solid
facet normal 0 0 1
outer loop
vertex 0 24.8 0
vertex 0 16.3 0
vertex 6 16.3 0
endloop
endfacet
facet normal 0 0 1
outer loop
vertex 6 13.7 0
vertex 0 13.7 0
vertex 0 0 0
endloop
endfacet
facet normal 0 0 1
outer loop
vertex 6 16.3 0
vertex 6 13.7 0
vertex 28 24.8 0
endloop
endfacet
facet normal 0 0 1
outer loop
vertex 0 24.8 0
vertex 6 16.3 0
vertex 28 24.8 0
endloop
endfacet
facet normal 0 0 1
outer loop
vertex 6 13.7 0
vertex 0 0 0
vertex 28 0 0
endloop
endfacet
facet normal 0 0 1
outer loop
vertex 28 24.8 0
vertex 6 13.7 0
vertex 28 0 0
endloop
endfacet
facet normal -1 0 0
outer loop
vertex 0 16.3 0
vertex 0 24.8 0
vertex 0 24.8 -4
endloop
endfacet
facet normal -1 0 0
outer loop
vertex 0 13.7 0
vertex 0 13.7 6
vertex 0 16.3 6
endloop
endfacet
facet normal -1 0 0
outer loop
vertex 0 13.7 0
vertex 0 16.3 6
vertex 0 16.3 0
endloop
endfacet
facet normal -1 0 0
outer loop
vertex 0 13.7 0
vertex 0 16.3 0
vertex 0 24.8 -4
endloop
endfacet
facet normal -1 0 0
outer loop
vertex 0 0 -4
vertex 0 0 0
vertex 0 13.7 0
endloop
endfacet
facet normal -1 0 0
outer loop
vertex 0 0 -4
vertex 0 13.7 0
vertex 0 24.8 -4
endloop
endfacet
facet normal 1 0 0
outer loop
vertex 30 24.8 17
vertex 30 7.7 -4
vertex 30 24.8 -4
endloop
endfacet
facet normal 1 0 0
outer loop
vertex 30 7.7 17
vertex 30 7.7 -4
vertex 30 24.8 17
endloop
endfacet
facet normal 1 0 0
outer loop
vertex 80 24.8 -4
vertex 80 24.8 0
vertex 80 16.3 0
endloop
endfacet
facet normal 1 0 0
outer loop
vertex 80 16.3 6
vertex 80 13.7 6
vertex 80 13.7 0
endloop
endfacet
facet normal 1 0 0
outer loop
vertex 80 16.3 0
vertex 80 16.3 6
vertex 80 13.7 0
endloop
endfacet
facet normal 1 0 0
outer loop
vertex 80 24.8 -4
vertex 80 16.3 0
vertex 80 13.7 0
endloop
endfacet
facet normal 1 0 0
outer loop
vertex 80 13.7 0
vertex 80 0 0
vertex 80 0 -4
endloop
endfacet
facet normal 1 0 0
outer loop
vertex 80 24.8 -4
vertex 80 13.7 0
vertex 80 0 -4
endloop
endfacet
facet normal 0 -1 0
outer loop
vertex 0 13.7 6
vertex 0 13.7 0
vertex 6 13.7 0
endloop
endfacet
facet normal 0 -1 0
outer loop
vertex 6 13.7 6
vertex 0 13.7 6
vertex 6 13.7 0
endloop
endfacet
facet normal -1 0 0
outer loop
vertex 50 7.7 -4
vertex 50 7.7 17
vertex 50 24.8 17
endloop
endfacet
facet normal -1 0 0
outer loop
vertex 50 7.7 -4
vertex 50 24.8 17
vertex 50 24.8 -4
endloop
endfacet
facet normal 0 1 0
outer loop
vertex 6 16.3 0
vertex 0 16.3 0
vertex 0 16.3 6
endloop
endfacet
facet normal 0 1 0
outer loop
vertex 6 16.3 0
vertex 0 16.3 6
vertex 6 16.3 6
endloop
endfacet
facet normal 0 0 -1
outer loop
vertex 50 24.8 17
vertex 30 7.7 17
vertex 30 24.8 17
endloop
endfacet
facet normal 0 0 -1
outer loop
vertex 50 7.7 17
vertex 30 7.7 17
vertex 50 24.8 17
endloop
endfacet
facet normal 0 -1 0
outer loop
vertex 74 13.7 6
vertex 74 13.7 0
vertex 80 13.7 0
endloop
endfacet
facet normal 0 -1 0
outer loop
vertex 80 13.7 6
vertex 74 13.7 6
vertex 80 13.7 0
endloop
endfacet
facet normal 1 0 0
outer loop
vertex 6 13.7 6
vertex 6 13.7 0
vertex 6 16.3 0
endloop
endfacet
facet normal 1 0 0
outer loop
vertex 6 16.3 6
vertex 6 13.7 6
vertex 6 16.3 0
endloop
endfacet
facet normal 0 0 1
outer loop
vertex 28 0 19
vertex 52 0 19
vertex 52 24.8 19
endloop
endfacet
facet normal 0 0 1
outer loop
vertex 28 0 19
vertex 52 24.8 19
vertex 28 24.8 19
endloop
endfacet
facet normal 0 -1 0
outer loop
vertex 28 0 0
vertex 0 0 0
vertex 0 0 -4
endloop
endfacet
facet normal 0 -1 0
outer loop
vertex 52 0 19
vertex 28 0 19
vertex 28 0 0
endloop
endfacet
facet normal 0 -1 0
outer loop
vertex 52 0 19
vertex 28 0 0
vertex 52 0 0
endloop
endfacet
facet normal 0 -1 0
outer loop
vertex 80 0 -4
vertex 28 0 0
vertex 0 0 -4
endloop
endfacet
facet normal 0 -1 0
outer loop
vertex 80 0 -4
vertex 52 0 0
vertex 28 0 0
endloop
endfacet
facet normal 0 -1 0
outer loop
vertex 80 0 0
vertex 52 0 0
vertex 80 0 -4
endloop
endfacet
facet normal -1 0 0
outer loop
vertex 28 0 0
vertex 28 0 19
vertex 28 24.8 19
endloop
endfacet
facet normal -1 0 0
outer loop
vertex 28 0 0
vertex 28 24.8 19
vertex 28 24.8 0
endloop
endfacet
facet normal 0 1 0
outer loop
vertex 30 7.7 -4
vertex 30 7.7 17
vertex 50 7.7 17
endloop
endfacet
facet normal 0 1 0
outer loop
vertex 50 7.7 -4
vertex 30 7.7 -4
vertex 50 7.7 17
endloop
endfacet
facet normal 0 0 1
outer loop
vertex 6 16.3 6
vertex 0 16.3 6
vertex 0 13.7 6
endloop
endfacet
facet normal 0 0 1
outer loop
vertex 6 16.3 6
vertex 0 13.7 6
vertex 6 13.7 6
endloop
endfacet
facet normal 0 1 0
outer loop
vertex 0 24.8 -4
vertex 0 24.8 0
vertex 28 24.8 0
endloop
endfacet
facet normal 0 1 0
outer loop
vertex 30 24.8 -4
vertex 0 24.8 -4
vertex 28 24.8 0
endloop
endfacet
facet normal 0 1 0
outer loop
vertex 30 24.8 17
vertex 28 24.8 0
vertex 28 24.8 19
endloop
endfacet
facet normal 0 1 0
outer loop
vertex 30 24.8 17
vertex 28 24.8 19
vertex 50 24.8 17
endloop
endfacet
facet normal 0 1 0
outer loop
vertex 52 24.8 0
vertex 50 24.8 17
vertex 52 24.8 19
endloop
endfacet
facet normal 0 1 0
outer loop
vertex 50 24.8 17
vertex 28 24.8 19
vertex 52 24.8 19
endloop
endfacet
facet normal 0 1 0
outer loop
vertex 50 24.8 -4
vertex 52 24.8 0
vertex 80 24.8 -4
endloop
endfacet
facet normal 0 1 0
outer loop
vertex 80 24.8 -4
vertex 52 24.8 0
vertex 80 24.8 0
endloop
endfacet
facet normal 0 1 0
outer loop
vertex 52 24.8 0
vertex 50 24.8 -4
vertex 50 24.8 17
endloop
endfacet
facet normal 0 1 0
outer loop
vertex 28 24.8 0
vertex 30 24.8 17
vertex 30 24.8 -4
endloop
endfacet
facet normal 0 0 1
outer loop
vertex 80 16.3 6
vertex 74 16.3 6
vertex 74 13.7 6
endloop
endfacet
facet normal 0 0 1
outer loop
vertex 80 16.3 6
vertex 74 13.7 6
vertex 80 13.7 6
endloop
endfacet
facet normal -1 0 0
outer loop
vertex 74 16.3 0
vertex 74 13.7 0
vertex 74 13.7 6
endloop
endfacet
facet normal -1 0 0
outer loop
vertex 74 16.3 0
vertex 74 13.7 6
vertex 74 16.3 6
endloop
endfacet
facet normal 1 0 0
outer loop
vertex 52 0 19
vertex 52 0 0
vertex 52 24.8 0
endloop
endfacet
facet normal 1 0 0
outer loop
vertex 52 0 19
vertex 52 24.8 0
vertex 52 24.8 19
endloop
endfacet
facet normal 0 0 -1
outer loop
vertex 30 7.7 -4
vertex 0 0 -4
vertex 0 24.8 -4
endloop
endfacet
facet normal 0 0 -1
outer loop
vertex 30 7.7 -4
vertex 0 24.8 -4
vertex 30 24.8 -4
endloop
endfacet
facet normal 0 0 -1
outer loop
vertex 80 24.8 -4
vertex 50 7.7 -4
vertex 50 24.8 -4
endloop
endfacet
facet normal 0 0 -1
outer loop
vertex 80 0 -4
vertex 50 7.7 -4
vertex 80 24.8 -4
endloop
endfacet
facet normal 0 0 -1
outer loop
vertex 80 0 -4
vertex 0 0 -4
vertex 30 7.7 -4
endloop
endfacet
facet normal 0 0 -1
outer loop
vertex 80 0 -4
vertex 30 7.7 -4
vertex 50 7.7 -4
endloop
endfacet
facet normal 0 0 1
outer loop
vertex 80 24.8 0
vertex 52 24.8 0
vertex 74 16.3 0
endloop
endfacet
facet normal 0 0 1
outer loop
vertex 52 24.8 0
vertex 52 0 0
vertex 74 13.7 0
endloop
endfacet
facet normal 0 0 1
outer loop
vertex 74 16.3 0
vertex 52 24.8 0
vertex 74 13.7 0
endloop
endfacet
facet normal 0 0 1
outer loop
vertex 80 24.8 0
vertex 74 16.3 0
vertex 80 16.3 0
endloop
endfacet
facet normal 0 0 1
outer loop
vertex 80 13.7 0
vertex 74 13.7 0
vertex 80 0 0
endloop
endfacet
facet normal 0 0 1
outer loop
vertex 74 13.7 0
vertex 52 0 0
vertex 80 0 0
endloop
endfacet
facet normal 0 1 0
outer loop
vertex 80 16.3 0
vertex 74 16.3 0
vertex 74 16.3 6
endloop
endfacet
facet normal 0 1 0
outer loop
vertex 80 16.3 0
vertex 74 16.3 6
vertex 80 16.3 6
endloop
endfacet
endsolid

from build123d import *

# Parameters (mm, degrees)
SKETCH1_W           = 80
SKETCH1_H           = 4
BOSS_EXTRUDE1_DEPTH = 24.8
SKETCH2_W           = 6
SKETCH2_H           = 2.6
BOSS_EXTRUDE2_DEPTH = 6
SKETCH3_W           = 20
SKETCH3_H           = 24.8
CUT_EXTRUDE1_DEPTH  = 10
EXTRUDE_THIN1_DEPTH = 24.8
SKETCH5_W           = 20
SKETCH5_H           = 21
BOSS_EXTRUDE3_DEPTH = 7.7


with BuildPart() as part:
    # Sketch1 → Boss-Extrude1 (new body)
    with BuildSketch(Plane(origin=(0, 0, 0), x_dir=(1, 0, 0), z_dir=(0, 1, 0))):
        with Locations((40, 2)):
            Rectangle(SKETCH1_W, SKETCH1_H)
    extrude(amount=BOSS_EXTRUDE1_DEPTH)

    # Sketch2 → Boss-Extrude2 (add)
    with BuildSketch(Plane.XY):
        with Locations((3, 15)):
            Rectangle(SKETCH2_W, SKETCH2_H)
        with Locations((77, 15)):
            Rectangle(SKETCH2_W, SKETCH2_H)
    extrude(amount=BOSS_EXTRUDE2_DEPTH)

    # Sketch3 → Cut-Extrude1 (cut)
    with BuildSketch(Plane.XY):
        with Locations((40, 12.4)):
            Rectangle(SKETCH3_W, SKETCH3_H)
    extrude(amount=-CUT_EXTRUDE1_DEPTH, mode=Mode.SUBTRACT)

    # Sketch4 → Extrude-Thin1 (add)
    with BuildSketch(Plane.XZ):
        Polygon((30, 0), (30, 17), (50, 17), (50, 0), (52, 0), (52, 19), (28, 19), (28, 0), align=None)
    extrude(amount=-EXTRUDE_THIN1_DEPTH)

    # Sketch5 → Boss-Extrude3 (add)
    with BuildSketch(Plane.XZ):
        with Locations((40, 6.5)):
            Rectangle(SKETCH5_W, SKETCH5_H)
    extrude(amount=-BOSS_EXTRUDE3_DEPTH)


solid = part.part
